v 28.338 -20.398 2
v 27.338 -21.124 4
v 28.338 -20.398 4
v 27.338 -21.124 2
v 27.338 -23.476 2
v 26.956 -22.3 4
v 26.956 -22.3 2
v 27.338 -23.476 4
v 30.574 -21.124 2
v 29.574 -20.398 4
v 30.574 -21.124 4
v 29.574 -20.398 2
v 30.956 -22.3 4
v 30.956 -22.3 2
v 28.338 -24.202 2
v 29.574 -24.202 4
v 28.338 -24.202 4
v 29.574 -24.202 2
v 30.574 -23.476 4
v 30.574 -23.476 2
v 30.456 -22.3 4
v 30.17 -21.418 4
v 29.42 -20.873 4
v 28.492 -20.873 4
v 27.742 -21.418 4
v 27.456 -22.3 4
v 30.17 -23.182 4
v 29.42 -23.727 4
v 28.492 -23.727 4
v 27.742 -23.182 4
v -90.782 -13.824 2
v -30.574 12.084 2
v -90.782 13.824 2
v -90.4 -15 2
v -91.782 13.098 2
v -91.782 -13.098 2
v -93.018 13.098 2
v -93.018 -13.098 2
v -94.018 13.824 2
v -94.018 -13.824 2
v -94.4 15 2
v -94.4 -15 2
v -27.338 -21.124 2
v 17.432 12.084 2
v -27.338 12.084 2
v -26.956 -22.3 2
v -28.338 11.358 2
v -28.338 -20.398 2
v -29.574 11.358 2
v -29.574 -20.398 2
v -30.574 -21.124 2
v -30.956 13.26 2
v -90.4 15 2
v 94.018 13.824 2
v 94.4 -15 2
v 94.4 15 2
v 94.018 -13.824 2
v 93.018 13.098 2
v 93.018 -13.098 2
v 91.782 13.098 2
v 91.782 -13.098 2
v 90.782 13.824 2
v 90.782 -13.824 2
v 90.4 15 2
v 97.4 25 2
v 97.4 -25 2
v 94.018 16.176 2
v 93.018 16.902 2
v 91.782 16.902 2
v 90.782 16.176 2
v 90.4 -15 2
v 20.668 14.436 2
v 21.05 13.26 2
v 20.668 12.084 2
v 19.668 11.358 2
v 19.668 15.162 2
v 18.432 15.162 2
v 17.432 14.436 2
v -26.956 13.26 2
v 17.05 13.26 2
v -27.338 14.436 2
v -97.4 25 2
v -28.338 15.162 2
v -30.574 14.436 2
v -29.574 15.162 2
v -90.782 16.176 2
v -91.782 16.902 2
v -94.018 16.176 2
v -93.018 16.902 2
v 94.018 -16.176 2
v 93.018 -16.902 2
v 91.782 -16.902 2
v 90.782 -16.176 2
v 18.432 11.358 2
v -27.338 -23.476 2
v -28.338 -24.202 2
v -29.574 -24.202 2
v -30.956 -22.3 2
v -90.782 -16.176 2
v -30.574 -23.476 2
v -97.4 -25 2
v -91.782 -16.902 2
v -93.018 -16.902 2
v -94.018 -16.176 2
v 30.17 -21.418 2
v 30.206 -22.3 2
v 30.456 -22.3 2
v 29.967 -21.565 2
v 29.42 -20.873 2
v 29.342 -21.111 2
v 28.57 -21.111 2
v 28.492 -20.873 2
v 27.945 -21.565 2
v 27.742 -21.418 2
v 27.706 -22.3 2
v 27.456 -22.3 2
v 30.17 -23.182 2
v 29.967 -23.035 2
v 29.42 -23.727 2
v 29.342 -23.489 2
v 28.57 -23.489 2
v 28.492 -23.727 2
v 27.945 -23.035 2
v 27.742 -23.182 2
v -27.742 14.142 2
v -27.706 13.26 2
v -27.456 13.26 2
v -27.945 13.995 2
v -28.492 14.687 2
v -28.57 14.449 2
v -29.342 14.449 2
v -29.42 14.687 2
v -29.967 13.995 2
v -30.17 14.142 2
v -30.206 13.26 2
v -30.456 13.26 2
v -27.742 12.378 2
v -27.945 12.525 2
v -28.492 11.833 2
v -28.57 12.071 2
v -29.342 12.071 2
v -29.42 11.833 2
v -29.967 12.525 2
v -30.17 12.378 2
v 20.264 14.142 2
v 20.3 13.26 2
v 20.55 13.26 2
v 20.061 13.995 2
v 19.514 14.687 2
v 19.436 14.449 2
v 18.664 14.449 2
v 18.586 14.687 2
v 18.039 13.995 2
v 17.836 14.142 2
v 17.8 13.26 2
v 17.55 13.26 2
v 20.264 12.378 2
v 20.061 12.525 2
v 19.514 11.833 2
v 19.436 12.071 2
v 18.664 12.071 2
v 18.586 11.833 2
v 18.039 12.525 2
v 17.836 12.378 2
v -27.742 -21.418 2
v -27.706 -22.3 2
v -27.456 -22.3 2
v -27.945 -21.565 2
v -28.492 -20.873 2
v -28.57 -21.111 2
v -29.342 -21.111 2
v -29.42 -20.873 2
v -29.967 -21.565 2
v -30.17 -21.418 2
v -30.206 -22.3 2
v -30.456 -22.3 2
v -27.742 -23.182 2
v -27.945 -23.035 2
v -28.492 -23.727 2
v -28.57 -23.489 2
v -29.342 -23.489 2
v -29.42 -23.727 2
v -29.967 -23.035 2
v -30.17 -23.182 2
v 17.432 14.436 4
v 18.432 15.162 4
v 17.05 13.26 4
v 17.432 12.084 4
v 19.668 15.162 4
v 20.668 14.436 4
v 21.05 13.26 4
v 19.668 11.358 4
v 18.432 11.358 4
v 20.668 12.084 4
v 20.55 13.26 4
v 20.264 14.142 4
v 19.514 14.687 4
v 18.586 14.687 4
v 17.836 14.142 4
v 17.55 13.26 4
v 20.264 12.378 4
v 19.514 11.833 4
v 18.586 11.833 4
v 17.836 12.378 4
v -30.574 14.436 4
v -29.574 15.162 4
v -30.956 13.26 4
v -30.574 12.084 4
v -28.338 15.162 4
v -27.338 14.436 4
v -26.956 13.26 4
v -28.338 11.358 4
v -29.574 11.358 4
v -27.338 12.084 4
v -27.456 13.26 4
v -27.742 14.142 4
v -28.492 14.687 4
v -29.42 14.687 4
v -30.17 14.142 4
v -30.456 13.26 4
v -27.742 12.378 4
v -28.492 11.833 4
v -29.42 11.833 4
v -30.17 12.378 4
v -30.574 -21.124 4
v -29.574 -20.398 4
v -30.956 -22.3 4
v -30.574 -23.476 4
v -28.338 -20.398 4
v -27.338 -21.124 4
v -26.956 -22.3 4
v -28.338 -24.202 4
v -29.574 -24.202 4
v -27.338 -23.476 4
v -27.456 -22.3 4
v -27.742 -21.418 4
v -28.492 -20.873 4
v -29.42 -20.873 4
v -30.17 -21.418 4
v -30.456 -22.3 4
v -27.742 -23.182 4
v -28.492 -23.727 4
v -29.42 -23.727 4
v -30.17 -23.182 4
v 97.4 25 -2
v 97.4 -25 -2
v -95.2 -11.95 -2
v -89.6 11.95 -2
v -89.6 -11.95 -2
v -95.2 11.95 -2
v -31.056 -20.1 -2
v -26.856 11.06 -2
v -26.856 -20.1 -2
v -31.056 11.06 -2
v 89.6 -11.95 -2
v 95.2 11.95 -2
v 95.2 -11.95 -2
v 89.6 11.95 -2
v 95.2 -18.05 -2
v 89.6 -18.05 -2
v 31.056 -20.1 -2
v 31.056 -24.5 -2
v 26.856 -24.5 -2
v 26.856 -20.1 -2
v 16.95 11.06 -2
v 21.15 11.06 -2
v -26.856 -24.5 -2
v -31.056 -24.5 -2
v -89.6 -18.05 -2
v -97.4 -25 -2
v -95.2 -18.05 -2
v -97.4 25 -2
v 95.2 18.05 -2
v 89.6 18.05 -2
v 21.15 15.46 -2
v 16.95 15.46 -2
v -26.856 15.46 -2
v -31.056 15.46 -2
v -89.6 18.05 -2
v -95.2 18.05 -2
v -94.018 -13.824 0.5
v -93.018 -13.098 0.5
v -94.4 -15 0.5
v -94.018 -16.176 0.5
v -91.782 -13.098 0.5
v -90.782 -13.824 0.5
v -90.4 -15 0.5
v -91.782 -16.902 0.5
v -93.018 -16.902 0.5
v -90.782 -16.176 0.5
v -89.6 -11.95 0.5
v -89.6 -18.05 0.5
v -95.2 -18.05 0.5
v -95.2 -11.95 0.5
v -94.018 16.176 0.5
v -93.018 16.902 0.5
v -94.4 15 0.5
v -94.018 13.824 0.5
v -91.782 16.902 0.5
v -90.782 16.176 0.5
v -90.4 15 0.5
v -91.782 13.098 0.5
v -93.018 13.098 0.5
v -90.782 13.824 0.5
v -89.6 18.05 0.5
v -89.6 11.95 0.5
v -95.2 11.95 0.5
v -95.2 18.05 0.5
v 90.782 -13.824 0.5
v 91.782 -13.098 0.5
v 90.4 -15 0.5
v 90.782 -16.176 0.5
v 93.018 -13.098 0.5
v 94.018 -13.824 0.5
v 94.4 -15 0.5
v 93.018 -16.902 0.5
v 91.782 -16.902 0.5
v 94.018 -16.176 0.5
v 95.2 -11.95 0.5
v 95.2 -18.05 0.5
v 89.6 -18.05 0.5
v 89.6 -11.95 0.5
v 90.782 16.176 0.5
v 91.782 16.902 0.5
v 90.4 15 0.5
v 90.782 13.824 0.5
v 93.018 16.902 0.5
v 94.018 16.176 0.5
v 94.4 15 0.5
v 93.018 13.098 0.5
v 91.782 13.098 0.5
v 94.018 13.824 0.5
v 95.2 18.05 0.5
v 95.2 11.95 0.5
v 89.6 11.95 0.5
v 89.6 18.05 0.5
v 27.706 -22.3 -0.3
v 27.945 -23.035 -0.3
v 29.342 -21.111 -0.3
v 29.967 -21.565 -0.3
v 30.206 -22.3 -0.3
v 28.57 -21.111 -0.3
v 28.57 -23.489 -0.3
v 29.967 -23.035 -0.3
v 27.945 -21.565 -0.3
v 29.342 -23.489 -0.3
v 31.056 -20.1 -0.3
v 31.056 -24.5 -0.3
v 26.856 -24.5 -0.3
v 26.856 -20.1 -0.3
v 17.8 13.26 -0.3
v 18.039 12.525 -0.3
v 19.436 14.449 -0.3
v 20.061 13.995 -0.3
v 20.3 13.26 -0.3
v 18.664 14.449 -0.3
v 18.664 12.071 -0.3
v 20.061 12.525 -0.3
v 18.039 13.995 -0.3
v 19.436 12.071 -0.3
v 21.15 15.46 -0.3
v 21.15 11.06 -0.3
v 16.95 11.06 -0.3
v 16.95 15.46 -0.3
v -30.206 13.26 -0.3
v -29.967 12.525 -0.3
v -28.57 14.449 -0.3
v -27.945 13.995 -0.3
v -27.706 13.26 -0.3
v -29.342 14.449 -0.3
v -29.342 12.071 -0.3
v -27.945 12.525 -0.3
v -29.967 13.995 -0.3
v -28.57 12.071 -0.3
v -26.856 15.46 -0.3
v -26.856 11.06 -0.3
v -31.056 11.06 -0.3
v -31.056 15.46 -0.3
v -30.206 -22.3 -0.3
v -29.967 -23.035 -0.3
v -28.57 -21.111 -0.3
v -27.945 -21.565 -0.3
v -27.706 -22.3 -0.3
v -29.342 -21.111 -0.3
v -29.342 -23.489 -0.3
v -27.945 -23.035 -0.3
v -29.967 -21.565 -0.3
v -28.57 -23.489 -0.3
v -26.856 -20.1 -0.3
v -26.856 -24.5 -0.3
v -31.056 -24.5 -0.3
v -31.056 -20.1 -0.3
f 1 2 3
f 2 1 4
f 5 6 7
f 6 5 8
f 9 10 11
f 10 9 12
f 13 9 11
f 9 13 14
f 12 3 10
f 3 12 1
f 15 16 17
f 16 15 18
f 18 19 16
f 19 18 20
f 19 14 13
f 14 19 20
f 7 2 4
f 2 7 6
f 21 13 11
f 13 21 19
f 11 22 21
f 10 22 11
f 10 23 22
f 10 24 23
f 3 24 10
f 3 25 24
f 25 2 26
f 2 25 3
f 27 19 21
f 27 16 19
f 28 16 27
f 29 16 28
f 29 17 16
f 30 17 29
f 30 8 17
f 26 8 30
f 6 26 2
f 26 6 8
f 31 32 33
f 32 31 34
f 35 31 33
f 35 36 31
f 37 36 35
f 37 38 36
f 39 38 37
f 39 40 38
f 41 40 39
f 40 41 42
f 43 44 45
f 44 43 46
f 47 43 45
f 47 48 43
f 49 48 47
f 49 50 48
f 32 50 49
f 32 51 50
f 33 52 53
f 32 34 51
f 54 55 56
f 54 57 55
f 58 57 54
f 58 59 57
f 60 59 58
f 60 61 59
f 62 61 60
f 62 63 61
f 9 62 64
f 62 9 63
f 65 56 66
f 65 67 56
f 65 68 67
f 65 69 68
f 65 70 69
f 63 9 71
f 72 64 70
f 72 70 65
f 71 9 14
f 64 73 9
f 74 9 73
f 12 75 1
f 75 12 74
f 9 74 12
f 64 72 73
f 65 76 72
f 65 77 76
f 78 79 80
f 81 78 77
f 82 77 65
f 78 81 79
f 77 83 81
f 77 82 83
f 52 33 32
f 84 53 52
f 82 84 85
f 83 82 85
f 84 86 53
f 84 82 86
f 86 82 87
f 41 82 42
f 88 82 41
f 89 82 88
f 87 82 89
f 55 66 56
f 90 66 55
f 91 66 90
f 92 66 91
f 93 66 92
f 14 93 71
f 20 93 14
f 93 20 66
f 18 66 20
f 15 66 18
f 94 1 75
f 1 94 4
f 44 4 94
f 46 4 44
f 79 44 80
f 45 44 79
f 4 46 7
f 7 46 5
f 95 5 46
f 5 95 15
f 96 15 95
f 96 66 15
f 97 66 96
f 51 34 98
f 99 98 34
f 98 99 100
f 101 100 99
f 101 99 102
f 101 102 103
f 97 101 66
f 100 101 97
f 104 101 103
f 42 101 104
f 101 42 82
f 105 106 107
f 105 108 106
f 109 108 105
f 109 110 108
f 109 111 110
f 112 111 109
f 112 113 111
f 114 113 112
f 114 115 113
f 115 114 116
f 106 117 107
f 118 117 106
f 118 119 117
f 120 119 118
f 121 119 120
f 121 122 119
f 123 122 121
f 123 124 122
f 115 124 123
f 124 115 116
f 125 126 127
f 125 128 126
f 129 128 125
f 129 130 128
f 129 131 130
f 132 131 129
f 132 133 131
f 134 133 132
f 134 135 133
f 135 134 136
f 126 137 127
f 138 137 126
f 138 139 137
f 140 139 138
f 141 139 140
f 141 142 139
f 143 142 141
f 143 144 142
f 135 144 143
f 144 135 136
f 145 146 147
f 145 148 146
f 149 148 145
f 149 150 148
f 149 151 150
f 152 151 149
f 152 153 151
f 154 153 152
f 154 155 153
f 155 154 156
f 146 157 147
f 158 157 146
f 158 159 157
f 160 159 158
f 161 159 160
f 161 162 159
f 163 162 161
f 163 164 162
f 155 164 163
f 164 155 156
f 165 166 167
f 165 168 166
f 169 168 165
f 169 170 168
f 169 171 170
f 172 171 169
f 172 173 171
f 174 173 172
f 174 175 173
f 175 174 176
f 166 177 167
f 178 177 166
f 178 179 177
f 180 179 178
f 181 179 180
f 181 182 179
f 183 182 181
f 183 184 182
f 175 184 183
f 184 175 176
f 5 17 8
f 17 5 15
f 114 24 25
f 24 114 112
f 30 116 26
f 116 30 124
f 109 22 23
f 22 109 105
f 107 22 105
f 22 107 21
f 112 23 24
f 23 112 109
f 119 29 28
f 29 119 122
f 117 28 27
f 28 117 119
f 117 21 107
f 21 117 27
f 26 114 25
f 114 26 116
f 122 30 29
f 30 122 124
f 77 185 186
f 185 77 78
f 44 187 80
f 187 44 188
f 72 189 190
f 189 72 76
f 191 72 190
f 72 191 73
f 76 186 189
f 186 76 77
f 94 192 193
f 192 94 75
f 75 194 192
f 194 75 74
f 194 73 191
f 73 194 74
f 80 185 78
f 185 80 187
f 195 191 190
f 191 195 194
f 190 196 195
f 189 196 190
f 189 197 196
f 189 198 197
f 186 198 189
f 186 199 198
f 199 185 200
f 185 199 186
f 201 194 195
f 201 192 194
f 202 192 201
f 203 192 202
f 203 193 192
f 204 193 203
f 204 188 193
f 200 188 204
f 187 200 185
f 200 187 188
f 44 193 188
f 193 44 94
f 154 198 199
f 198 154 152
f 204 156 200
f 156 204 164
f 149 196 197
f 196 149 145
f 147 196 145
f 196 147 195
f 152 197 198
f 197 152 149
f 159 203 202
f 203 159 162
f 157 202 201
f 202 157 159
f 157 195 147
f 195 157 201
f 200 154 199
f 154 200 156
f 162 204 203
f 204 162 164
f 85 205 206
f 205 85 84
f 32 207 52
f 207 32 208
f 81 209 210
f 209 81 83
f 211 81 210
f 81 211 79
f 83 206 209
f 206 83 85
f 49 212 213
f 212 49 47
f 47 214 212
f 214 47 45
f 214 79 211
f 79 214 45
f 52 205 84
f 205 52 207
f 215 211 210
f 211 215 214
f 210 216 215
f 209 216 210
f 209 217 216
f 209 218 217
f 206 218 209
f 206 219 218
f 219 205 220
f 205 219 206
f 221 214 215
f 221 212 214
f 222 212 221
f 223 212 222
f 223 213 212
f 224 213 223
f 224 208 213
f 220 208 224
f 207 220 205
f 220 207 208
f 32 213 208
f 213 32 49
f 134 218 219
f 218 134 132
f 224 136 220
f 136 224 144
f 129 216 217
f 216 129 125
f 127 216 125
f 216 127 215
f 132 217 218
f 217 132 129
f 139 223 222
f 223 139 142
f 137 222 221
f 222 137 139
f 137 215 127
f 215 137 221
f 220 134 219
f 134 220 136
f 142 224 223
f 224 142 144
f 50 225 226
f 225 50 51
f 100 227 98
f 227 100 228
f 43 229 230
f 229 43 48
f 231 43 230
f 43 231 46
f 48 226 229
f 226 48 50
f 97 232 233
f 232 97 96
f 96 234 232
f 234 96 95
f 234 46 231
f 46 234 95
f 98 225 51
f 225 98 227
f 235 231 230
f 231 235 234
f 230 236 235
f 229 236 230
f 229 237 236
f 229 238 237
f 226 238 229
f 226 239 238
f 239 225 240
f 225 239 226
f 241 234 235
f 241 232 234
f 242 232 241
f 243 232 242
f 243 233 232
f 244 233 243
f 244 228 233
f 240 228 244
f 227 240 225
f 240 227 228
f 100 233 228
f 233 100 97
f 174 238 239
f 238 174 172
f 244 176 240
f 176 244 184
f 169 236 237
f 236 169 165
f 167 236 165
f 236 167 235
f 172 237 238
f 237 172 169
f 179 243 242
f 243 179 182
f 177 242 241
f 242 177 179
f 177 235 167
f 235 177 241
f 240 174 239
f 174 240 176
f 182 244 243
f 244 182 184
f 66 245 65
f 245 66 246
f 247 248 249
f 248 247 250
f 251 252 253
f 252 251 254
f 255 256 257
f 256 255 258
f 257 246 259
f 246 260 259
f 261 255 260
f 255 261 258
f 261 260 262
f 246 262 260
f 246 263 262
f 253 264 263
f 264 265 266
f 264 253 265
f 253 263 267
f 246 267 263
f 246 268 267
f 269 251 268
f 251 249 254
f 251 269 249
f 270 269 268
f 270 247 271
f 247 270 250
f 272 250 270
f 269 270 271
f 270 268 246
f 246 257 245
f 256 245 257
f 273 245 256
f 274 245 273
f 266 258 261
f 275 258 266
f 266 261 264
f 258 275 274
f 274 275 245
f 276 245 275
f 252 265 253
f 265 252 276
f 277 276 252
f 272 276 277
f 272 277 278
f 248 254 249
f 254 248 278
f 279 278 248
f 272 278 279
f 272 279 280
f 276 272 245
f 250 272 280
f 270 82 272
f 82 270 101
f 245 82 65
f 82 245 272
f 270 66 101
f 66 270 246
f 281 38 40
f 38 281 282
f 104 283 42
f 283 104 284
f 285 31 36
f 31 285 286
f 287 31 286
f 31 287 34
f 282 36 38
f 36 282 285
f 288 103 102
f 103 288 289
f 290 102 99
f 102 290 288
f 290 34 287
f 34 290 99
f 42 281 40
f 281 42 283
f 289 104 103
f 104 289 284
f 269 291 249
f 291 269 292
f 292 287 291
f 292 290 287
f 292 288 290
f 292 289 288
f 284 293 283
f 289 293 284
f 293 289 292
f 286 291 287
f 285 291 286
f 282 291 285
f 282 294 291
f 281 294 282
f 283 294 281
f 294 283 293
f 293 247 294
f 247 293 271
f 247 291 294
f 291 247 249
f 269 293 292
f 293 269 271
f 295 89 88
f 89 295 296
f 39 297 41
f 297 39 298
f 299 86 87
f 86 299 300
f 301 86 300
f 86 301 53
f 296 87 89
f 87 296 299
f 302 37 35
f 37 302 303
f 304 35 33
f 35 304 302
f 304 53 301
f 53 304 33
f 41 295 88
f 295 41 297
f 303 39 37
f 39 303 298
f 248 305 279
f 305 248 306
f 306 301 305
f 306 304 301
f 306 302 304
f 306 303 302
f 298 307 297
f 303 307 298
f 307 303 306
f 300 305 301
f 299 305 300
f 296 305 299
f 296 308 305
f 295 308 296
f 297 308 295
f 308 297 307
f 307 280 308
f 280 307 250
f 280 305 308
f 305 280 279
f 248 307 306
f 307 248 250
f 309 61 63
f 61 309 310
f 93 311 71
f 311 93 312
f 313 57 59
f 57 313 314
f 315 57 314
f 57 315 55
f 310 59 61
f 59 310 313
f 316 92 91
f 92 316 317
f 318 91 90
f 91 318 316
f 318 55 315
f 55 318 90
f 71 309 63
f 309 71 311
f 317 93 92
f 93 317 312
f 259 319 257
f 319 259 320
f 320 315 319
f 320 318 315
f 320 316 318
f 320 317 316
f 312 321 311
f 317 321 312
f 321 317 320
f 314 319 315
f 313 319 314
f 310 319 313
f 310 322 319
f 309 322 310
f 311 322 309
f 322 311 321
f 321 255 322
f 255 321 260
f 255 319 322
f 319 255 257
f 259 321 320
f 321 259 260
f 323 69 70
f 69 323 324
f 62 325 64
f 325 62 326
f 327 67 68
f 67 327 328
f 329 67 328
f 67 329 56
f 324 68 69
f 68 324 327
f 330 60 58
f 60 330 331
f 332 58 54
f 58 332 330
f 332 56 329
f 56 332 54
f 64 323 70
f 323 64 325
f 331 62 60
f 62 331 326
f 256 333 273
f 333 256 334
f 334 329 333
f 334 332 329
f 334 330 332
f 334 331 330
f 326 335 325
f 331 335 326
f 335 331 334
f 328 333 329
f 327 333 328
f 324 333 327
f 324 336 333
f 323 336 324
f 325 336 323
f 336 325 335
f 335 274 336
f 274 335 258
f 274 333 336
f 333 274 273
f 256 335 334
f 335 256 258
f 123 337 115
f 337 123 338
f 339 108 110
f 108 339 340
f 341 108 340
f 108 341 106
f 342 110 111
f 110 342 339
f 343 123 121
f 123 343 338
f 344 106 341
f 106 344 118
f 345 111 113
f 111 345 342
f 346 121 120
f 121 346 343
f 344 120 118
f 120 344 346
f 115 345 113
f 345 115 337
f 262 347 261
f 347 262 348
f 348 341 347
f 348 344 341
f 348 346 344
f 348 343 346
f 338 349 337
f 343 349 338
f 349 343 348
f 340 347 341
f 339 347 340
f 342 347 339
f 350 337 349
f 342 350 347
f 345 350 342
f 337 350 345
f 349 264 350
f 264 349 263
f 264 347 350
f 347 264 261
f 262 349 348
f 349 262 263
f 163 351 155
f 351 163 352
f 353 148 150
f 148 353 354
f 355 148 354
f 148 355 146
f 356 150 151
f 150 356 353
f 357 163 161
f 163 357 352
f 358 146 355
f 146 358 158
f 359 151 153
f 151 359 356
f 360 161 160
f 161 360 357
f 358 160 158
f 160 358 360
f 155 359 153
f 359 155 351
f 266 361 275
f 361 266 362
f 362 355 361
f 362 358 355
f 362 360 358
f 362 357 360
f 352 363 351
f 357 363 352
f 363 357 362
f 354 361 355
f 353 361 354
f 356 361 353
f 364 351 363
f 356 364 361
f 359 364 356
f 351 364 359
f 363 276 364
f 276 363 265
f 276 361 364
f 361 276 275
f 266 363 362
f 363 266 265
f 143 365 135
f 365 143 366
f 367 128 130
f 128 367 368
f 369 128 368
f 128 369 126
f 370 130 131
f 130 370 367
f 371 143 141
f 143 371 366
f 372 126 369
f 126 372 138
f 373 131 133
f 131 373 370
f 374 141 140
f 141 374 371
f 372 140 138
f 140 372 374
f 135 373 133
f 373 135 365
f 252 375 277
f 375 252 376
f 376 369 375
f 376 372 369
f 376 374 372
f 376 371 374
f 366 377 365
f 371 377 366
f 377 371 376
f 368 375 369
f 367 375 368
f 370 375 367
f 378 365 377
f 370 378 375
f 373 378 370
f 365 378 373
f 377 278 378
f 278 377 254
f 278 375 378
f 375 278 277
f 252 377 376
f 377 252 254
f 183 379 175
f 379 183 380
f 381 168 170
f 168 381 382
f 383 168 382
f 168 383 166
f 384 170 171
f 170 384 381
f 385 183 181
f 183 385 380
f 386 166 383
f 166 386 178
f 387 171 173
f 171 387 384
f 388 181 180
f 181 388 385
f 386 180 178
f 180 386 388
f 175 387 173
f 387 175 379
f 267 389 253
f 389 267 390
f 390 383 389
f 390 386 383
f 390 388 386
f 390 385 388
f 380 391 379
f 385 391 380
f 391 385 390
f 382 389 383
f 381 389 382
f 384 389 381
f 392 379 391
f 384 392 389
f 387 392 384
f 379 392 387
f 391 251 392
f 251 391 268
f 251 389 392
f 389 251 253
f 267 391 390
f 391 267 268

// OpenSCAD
$fn = 10;
module capturedM2Nut()
{
	cylinder(r=1.25,4, center=true);
	translate([0,0,-1.15])
	{	
		cube([4.2, 4.4, 1.7], center=true);
	}
}

module capturedM3Nut()
{
	cylinder(r=2, 4, center=true);
	translate([0,0,-0.75])
	{	
		cube([5.6, 6.1, 2.5], center=true);
	}
}

module standoff()
{
	translate([0, 0, 3])
	{
		difference()
		{
			cylinder(r = 2, h= 2, center=true);
			cylinder(r = 1.5, h = 2, center=true);
		}
	}
}

module plate()
{
	cube([194.8, 50, 4], center=true);
	
	translate([0, -4.52, 0])
	{
	translate([57.912/2, -35.56/2, 0])
	{
		standoff();
	}
	translate([19.05, 35.56/2, 0])
	{
		standoff();
	}
	translate([-57.912/2, 35.56/2, 0])
	{
		standoff();
	}
	translate([-57.912/2, -35.56/2, 0])
	{
		standoff();
	}
	}
}

difference()
{
	plate();
	translate([-92.4,-15])
	{
		capturedM3Nut();
	}
	translate([-92.4,15])
	{
		capturedM3Nut();
	}
	translate([92.4,-15])
	{
		capturedM3Nut();
	}
	translate([92.4,15])
	{
		capturedM3Nut();
	}

	translate([0, -4.52, 0])
	{
	translate([57.912/2, -35.56/2, 0])
	{
		capturedM2Nut();
	}
	translate([19.05, 35.56/2, 0])
	{
		capturedM2Nut();
	}
	translate([-57.912/2, 35.56/2, 0])
	{
		capturedM2Nut();
	}
	translate([-57.912/2, -35.56/2, 0])
	{
		capturedM2Nut();
	}
}
}
